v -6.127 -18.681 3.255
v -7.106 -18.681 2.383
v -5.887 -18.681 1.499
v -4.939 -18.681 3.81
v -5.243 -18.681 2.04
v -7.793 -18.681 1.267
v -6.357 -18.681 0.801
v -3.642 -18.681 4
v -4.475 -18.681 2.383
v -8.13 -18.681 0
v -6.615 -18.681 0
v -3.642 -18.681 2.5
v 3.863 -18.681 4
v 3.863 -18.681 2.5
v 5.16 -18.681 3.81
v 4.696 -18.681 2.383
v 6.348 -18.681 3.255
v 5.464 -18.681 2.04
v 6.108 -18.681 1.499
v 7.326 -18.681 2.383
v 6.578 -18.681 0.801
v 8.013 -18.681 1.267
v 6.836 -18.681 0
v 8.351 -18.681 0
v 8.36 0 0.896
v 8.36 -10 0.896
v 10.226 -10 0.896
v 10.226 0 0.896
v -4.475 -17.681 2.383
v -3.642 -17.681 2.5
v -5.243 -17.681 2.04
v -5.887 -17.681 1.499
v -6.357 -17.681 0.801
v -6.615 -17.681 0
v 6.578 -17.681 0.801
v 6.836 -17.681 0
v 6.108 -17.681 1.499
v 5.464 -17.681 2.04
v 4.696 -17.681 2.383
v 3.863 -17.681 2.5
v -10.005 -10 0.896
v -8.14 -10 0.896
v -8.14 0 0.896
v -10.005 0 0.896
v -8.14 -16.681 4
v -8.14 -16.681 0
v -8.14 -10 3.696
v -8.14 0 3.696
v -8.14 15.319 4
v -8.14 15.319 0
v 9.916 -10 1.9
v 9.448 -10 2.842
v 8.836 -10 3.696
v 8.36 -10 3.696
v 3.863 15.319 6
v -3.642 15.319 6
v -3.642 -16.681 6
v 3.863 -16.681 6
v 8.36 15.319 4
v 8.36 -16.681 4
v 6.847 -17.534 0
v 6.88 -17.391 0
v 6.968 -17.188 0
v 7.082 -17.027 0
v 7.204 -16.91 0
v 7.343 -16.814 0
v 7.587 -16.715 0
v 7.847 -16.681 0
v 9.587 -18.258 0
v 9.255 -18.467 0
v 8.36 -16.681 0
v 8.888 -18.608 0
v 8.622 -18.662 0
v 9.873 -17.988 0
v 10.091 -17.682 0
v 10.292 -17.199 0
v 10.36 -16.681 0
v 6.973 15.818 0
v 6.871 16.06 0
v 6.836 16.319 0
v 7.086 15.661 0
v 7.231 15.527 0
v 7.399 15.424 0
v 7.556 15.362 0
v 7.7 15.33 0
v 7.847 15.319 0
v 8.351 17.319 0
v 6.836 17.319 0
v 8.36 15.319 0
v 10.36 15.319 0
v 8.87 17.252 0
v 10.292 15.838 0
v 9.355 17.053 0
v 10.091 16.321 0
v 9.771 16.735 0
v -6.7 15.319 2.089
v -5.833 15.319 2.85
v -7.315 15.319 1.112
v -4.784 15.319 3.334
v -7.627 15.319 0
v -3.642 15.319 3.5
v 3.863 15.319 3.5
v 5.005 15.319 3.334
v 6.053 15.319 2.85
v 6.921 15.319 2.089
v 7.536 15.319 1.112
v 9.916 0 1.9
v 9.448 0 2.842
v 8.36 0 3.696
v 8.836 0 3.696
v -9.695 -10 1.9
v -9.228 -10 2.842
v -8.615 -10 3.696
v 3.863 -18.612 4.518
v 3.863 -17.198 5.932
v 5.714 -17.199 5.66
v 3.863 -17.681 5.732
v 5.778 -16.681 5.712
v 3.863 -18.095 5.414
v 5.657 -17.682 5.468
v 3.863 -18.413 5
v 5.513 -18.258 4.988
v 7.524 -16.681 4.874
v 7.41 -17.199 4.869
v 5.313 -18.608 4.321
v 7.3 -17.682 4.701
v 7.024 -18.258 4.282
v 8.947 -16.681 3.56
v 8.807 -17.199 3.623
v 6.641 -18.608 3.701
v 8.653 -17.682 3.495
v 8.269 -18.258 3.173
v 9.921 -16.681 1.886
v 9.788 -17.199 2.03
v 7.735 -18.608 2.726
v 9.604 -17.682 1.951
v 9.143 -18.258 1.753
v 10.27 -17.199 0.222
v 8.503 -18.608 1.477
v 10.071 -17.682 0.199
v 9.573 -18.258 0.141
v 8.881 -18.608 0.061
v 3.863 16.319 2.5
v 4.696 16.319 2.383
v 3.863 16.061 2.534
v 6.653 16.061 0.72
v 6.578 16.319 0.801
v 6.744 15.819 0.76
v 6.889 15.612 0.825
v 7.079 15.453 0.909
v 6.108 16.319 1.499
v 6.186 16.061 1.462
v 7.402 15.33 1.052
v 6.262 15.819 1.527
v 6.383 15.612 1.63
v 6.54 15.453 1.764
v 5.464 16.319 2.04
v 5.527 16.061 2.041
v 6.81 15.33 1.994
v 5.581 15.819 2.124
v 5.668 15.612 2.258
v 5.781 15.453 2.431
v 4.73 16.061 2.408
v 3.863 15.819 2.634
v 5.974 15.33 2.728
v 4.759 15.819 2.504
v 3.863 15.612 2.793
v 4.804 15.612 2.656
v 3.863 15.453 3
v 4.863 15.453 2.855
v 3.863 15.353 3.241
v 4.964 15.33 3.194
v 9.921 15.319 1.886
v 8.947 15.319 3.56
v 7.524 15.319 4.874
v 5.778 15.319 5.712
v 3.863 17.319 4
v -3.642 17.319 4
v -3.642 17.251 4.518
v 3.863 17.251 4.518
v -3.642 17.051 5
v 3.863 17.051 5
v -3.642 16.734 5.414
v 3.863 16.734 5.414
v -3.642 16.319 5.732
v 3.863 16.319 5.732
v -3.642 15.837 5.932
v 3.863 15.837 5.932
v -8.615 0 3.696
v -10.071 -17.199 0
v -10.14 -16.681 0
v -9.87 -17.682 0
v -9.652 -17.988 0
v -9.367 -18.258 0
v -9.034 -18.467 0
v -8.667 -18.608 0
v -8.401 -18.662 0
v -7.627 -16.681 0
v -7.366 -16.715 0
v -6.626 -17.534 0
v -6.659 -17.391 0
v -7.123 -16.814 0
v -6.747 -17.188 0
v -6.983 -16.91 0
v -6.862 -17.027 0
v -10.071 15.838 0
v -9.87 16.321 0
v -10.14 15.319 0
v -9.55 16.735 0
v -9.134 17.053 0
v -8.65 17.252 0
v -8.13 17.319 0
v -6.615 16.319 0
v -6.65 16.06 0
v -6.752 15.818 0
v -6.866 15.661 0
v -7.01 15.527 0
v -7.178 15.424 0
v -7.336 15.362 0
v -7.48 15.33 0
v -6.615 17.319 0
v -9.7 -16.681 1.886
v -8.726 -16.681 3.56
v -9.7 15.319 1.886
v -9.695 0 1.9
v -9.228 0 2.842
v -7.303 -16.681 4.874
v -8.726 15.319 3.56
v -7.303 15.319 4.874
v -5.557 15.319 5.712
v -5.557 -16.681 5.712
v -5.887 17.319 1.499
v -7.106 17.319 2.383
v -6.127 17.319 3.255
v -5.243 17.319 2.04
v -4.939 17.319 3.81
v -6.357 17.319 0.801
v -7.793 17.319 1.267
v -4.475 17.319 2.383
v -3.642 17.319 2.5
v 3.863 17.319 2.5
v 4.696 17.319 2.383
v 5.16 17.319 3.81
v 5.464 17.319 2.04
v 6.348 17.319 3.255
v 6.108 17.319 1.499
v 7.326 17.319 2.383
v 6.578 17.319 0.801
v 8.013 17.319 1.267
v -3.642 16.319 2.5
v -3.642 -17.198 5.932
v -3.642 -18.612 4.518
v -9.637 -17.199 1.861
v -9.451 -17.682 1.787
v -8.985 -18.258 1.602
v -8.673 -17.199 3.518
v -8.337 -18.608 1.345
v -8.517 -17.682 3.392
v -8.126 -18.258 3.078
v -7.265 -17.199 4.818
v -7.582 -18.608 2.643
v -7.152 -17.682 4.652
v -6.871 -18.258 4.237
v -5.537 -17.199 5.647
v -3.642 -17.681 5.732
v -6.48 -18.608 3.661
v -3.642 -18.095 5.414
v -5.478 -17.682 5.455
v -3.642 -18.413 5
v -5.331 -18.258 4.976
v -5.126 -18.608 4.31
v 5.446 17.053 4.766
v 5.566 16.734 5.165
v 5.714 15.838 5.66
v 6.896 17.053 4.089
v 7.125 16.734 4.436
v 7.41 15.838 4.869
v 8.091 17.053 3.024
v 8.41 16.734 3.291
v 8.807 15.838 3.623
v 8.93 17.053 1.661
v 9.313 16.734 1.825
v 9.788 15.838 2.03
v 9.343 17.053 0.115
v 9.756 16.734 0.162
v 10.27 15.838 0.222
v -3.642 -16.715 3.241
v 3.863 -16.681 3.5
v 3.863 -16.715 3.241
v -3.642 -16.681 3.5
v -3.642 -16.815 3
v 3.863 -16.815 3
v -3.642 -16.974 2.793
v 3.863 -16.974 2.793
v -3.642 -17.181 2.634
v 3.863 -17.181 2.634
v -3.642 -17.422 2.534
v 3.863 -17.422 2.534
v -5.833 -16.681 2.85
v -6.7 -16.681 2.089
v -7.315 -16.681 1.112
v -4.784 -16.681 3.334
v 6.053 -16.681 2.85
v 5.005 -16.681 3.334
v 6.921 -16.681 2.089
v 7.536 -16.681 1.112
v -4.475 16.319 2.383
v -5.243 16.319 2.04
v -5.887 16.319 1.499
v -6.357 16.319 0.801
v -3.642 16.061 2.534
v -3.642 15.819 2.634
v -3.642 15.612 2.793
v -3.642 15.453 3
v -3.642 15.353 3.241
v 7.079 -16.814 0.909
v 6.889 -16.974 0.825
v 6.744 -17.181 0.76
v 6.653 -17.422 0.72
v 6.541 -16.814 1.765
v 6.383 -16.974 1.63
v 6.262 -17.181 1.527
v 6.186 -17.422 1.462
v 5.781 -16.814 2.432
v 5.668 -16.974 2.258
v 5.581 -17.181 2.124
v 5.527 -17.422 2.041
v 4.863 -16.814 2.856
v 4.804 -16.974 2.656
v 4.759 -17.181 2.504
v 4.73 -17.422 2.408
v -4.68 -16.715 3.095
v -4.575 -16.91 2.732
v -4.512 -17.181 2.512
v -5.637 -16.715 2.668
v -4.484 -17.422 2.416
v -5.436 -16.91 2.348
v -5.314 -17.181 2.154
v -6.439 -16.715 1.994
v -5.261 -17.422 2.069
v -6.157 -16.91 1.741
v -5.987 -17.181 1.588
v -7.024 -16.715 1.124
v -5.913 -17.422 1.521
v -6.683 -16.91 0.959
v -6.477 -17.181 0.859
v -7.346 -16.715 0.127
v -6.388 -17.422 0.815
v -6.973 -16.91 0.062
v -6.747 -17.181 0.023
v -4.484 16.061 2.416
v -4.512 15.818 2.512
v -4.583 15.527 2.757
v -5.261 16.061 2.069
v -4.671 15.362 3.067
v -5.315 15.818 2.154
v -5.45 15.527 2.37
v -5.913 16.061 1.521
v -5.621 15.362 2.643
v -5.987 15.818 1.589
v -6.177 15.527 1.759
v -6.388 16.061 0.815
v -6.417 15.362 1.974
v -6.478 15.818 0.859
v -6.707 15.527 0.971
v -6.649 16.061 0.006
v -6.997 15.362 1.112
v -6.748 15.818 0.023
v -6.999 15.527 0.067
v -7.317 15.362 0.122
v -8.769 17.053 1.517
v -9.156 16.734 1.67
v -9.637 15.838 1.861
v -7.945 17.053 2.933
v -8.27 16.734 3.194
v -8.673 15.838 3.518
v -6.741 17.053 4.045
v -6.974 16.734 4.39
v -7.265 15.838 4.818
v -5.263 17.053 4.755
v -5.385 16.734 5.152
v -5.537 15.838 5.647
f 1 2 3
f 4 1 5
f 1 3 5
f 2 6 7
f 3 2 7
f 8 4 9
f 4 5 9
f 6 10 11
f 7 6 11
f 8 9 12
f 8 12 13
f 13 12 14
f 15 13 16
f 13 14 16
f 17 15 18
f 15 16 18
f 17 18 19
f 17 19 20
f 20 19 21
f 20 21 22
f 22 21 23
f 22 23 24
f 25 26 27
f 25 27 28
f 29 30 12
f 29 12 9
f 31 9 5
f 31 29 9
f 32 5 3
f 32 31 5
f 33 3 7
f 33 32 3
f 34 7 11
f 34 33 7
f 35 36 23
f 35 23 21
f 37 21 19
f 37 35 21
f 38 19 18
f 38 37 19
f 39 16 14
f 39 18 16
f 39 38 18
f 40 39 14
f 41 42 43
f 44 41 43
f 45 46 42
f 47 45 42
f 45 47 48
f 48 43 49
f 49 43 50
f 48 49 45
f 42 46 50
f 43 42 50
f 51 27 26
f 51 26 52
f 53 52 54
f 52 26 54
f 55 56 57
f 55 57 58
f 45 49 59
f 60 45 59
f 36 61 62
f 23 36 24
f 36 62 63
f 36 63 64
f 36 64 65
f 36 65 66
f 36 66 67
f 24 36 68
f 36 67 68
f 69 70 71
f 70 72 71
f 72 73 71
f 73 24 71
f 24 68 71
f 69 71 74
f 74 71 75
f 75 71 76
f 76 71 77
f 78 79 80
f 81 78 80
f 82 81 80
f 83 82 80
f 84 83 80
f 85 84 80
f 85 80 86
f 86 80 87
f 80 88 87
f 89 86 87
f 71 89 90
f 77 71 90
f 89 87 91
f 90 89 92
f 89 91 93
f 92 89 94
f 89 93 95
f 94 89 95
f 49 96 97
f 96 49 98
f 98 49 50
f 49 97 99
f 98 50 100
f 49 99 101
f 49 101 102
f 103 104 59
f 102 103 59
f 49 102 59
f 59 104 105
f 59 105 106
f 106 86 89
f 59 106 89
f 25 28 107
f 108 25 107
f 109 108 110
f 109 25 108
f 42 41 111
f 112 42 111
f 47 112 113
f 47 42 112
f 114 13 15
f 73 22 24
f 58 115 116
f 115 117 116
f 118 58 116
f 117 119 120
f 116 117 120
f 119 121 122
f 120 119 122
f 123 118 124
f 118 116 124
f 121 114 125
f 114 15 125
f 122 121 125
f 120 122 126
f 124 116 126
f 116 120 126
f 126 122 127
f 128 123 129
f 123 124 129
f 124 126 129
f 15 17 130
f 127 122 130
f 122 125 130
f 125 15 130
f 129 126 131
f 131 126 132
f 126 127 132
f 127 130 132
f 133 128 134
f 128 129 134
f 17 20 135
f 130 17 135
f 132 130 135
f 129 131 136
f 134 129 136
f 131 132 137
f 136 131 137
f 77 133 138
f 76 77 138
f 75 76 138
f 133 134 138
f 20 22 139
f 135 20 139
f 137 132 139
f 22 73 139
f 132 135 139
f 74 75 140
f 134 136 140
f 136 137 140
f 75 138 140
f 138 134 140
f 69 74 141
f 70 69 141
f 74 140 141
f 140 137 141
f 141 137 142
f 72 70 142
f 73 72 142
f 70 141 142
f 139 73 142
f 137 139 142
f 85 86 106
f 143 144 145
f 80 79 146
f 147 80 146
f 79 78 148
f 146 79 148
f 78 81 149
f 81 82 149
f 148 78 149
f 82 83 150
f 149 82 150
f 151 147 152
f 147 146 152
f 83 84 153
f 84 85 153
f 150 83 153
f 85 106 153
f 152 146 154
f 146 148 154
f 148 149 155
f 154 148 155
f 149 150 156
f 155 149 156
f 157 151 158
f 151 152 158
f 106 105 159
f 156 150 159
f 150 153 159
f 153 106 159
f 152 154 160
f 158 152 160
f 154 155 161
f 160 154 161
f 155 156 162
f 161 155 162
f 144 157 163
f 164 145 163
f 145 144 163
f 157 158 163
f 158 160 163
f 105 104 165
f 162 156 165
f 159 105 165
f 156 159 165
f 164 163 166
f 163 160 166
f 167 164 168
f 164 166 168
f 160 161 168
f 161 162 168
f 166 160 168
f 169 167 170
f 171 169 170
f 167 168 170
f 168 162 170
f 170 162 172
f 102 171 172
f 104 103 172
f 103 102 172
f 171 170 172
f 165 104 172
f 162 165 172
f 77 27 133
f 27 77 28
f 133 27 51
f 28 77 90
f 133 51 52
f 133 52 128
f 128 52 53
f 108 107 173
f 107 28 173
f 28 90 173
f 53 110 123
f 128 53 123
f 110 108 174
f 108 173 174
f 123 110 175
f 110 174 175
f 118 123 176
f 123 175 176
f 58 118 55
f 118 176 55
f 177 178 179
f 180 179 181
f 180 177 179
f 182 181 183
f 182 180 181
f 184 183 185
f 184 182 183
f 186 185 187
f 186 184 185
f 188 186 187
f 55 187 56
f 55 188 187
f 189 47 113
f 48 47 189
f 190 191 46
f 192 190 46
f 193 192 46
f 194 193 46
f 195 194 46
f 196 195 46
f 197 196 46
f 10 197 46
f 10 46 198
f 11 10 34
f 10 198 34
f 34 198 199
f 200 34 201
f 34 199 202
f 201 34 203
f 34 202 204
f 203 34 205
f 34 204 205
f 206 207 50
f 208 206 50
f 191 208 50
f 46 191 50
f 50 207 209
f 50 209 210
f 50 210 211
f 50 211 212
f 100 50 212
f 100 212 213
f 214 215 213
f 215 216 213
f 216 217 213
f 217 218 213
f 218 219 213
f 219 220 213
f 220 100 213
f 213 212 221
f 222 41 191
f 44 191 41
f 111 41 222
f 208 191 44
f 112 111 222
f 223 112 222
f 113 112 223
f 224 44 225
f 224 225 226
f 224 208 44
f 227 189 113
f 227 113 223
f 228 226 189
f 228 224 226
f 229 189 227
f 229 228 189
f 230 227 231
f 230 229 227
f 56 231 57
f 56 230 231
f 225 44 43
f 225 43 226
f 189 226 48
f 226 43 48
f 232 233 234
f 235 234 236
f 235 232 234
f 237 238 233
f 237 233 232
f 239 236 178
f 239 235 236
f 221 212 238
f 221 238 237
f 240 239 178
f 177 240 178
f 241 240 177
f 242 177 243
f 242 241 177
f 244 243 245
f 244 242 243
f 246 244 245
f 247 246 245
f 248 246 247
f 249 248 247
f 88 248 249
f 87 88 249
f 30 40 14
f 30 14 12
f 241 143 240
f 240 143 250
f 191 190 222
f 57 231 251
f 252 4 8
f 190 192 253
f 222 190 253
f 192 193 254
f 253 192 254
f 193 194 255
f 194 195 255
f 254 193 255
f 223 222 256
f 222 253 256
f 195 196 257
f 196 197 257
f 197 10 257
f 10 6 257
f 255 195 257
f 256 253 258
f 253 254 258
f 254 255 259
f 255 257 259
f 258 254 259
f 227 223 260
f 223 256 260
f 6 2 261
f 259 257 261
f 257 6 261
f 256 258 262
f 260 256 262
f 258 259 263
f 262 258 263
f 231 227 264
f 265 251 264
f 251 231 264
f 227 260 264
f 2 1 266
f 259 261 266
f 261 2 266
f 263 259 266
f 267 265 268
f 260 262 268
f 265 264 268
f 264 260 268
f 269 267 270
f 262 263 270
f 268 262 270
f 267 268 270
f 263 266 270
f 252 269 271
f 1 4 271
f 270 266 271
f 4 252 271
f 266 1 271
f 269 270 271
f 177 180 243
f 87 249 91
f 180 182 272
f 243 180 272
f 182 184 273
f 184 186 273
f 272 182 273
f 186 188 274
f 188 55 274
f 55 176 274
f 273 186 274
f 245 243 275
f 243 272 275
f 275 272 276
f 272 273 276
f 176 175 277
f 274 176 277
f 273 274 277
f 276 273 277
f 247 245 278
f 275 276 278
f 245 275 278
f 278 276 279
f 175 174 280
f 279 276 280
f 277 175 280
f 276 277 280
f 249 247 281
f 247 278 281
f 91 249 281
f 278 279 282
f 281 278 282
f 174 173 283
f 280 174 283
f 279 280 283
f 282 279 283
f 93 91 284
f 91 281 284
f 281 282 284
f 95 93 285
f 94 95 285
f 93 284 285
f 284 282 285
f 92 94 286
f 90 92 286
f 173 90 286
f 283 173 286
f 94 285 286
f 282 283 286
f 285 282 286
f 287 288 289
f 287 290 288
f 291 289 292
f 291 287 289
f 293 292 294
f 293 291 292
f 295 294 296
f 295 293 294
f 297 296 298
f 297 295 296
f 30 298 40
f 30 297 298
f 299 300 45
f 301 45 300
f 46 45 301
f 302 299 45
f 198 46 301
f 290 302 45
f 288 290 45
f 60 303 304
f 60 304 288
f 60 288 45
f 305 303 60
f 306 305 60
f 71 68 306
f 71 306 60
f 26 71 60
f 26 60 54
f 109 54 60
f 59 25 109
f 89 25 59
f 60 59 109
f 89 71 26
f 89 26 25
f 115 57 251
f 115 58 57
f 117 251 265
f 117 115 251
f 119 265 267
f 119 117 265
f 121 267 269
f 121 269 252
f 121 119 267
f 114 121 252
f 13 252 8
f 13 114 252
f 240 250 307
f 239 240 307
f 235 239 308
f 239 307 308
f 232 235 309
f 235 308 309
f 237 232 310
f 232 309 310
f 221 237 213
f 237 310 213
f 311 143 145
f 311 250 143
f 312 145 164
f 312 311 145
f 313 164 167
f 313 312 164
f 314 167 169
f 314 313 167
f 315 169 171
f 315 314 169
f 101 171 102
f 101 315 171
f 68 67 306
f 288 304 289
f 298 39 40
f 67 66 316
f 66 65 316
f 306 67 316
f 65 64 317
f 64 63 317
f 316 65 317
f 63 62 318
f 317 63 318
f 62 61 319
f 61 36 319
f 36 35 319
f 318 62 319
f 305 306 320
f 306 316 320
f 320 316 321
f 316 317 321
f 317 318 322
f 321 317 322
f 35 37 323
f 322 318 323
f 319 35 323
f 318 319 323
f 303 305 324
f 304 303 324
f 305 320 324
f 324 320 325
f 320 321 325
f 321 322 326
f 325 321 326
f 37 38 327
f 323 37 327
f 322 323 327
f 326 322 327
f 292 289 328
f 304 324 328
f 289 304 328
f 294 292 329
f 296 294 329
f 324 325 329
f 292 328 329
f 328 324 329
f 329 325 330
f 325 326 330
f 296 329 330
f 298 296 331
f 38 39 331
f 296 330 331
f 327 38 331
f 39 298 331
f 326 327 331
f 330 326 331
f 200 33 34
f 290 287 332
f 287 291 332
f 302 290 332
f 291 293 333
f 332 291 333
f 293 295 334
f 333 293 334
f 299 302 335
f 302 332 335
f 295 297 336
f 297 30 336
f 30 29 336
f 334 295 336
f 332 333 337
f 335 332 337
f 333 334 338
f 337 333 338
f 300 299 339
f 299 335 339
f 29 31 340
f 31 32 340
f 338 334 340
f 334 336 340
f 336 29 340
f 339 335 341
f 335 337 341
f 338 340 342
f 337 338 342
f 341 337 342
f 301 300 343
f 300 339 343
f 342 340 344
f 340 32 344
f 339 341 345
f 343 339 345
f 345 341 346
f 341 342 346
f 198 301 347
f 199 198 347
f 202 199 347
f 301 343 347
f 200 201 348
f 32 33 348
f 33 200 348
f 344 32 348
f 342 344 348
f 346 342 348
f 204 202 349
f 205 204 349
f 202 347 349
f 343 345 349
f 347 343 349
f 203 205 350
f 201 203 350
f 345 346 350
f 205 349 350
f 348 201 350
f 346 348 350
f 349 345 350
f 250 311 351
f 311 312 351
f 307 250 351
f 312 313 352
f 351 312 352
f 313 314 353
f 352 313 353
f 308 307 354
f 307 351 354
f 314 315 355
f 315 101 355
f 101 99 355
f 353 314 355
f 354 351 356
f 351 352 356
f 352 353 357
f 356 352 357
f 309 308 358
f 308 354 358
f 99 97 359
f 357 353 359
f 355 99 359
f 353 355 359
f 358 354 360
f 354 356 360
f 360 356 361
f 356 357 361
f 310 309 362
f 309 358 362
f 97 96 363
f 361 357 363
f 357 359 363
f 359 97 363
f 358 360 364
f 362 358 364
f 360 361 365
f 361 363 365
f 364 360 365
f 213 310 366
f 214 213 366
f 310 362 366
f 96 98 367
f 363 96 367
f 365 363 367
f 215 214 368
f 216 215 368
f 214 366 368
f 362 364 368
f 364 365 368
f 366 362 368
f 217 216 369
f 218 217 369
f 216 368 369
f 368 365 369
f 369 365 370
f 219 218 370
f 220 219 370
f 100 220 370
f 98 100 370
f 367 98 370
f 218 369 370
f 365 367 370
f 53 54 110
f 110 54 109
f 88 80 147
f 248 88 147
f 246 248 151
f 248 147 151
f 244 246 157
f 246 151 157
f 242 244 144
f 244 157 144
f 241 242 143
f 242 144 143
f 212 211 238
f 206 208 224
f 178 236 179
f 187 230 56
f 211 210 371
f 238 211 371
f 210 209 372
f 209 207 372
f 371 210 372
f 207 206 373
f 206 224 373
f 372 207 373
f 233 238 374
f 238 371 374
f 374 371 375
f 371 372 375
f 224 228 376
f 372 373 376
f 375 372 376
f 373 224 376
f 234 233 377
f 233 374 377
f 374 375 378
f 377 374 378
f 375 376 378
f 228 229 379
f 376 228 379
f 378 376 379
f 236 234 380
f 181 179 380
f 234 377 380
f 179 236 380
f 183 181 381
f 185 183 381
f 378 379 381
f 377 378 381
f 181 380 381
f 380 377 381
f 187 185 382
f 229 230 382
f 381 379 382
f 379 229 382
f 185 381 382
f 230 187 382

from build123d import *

# Parameters (mm, degrees)
F1_W           = 20.5
F1_H           = 36
F2_DEPTH       = 6
F0_W           = 16.5
F0_H           = 32
F3_DEPTH       = 4
F4_T1_DEPTH    = 68.4886593371
F5_R           = 2
F7_DEPTH       = 25
F7_DEPTH_BACK  = 20.4
F8_R           = 1
F9_W           = 10
F9_H           = 2.8
F10_DEPTH      = 25
F10_DEPTH_BACK = 25


# Not quite as in the source:
# - a fillet or chamfer that OpenCascade refuses, or shapes differently, is made with other operations: its cross-section is extruded or revolved along the edge and cut away or added


with BuildPart() as f2:
    # F1 (on Top) → F2 (new body)
    with BuildSketch(Plane.XY):
        with Locations((0.1103486419, -0.6806470305)):
            Rectangle(F1_W, F1_H)
    extrude(amount=F2_DEPTH)

    # F0 (on Top) → F3 (cut)
    with BuildSketch(Plane.XY):
        with Locations((0.1103486419, -0.6806470305)):
            Rectangle(F0_W, F0_H)
    extrude(amount=F3_DEPTH, mode=Mode.SUBTRACT)

    # F4: fillet of radius 6.5183766184 on 2 edges, made by hand

    # F4_s2 → F4_t1 (cut)
    with BuildSketch(Plane.XZ.offset(-33.5636826381)):
        with BuildLine():
            ThreePointArc((10.3603486419, 0), (8.2847350288, 4.270579832), (3.8626167745, 6))
            Line((3.8626167745, 6), (10.3603486419, 6))
            Line((10.3603486419, 6), (10.3603486419, 0))
        make_face()
        with BuildLine():
            ThreePointArc((-10.1396513581, 0), (-8.064037745, 4.270579832), (-3.6419194907, 6))
            Line((-3.6419194907, 6), (-10.1396513581, 6))
            Line((-10.1396513581, 6), (-10.1396513581, 0))
        make_face()
    extrude(amount=F4_T1_DEPTH, mode=Mode.SUBTRACT)

    # F5
    f5_edges = [f2.edges().sort_by_distance(p)[0] for p in [
        (0.110349, 17.319353, 6),
        (8.284735, 17.319353, 4.27058),
        (-8.064038, -18.680647, 4.27058),
        (-8.064038, 17.319353, 4.27058),
        (0.110349, -18.680647, 6),
        (8.284735, -18.680647, 4.27058),
    ]]
    fillet(f5_edges, radius=F5_R)

    # F6 (on Front) → F7 (cut, two sides)
    with BuildSketch(Plane.XZ) as f7_sk:
        with BuildLine():
            ThreePointArc((6.8361471832, 0), (5.8050304207, 1.791953799), (3.8626167745, 2.5))
            Line((3.8626167745, 2.5), (-3.6419194907, 2.5))
            ThreePointArc((-3.6419194907, 2.5), (-5.5843331369, 1.791953799), (-6.6154498995, 0))
            Line((-6.6154498995, 0), (6.8361471832, 0))
        make_face()
    extrude(amount=-F7_DEPTH, mode=Mode.SUBTRACT)
    extrude(f7_sk.sketch, amount=F7_DEPTH_BACK, mode=Mode.SUBTRACT)

    # F8
    f8_edges = [f2.edges().sort_by_distance(p)[0] for p in [
        (-5.584333, 15.319353, 1.791954),
        (0.110349, -16.680647, 2.5),
        (5.80503, 15.319353, 1.791954),
        (0.110349, 15.319353, 2.5),
        (5.80503, -16.680647, 1.791954),
        (-5.584333, -16.680647, 1.791954),
    ]]
    fillet(f8_edges, radius=F8_R)

    # F9 (on Right) → F10 (cut, two sides)
    with BuildSketch(Plane.YZ) as f10_sk:
        with Locations((-5, 2.2957557753)):
            Rectangle(F9_W, F9_H)
    extrude(amount=-F10_DEPTH, mode=Mode.SUBTRACT)
    extrude(f10_sk.sketch, amount=F10_DEPTH_BACK, mode=Mode.SUBTRACT)


solid = f2.part
